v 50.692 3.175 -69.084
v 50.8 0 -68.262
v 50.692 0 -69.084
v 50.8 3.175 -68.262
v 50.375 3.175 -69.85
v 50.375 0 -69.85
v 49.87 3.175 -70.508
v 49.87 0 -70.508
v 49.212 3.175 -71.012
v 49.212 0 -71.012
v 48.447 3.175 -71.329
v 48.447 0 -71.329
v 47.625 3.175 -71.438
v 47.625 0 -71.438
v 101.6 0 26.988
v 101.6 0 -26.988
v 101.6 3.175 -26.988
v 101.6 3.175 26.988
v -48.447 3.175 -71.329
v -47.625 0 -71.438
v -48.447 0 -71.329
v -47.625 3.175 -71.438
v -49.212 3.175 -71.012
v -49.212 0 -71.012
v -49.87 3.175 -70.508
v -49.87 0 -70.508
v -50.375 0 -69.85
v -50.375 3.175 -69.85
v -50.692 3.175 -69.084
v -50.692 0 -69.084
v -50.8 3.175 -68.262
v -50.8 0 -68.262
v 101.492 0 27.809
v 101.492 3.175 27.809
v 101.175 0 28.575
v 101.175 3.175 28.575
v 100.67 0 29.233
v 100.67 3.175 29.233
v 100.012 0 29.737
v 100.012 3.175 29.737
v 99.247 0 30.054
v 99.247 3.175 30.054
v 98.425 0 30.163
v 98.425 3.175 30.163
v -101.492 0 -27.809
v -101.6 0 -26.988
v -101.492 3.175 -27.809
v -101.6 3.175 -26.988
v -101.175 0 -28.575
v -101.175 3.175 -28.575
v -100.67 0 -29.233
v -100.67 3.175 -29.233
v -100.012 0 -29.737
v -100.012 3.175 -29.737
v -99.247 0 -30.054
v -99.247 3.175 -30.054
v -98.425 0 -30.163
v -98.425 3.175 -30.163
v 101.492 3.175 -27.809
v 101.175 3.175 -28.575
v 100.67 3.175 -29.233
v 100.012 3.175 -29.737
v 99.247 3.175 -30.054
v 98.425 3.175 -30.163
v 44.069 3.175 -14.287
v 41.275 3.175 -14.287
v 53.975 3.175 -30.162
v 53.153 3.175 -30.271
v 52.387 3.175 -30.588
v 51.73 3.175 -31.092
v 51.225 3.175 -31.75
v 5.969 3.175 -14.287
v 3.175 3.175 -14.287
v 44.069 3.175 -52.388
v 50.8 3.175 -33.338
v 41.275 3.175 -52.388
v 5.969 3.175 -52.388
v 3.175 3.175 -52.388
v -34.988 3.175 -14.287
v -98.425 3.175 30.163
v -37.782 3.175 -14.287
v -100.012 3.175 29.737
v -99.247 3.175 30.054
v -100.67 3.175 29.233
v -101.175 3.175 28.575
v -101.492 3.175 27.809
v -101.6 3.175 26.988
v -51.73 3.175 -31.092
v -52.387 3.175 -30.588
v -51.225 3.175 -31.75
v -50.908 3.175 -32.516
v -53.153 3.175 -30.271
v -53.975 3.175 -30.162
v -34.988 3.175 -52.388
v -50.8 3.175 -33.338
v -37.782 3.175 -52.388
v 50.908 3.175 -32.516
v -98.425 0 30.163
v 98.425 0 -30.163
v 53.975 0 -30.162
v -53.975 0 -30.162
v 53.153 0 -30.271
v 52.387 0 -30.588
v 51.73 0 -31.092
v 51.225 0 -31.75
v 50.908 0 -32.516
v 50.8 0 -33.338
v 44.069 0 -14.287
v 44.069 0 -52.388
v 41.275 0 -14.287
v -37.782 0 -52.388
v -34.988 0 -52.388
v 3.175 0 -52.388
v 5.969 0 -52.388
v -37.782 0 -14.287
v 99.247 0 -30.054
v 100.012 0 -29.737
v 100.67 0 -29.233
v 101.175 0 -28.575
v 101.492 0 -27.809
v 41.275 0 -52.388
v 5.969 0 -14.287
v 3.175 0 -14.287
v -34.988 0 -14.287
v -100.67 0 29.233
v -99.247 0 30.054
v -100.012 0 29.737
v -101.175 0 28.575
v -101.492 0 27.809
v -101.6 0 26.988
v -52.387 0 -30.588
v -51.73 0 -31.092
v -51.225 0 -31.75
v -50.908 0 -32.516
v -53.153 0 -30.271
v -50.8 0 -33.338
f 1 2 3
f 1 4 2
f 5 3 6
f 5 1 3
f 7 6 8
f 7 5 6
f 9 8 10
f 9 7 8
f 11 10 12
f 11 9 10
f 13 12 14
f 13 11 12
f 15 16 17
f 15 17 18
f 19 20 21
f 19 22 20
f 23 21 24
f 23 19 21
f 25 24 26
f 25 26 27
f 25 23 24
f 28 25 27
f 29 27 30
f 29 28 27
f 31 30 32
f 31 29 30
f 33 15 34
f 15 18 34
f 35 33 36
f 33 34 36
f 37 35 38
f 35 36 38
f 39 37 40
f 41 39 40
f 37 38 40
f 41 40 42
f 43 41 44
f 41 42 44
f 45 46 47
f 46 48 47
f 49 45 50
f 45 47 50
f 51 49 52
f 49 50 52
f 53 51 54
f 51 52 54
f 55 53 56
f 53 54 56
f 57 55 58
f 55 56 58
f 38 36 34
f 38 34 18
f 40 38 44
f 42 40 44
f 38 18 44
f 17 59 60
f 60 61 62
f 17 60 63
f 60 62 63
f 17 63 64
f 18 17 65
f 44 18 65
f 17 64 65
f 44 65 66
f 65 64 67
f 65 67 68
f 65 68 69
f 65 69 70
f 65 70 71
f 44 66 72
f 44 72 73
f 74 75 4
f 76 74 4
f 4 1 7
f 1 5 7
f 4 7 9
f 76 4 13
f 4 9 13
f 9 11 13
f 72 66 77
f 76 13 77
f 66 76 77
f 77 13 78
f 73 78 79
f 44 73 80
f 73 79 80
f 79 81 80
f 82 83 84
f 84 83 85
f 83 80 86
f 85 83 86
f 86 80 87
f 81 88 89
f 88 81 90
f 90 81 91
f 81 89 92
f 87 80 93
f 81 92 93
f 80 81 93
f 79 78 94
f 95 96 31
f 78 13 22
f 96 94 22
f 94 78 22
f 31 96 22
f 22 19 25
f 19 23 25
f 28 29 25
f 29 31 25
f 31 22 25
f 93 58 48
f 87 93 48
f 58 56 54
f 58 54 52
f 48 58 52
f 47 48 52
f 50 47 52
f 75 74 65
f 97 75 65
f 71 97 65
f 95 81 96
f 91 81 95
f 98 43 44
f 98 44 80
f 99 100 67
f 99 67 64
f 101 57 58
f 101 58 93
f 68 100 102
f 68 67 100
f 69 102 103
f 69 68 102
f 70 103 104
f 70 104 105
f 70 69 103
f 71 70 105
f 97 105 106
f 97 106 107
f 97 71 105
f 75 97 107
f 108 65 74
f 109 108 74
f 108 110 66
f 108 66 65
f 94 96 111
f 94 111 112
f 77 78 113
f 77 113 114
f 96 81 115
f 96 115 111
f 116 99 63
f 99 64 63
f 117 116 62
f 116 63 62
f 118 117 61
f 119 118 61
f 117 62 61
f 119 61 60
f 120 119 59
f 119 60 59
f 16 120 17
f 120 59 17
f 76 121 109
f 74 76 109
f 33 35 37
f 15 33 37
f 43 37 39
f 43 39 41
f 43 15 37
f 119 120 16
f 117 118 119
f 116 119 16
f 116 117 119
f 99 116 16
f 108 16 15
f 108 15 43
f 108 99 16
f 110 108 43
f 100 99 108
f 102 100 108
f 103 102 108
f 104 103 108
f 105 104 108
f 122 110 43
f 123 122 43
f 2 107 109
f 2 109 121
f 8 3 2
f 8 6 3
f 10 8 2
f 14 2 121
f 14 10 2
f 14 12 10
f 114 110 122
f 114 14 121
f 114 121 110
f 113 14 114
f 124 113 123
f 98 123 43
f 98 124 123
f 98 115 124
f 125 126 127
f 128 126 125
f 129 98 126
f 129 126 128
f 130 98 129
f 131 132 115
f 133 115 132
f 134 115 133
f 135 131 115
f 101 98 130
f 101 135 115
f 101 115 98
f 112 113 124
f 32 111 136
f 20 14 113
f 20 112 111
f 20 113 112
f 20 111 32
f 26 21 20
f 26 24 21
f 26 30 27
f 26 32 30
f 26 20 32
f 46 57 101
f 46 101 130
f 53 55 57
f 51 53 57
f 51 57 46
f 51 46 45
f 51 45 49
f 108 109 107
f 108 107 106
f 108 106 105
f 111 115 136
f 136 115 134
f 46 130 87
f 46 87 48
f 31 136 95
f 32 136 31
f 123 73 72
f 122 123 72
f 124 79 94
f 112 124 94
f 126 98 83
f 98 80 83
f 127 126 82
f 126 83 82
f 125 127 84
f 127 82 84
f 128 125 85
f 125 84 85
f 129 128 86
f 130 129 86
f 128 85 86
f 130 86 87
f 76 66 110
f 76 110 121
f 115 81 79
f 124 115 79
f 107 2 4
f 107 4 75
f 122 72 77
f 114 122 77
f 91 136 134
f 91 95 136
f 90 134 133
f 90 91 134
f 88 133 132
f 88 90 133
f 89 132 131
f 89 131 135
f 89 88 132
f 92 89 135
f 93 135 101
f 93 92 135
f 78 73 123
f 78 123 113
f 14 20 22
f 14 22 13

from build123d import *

# Parameters (mm, degrees)
BOSS_EXTRUDE1_DEPTH = 3.175
SKETCH2_W           = 2.794
SKETCH2_H           = 38.1
CUT_EXTRUDE1_DEPTH  = 3.175
FILLET1_R           = 3.175
SKETCH3_W           = 2.794
SKETCH3_H           = 38.1
CUT_EXTRUDE2_DEPTH  = 9.525
SKETCH4_W           = 2.794
SKETCH4_H           = 38.1
CUT_EXTRUDE3_DEPTH  = 3.175


with BuildPart() as part:
    # Sketch1 → Boss-Extrude1 (new body)
    with BuildSketch(Plane(origin=(0, 0, 0), x_dir=(1, 0, 0), z_dir=(0, 1, 0))):
        Polygon((50.8, 30.1625), (101.6, 30.1625), (101.6, -30.1625), (-101.6, -30.1625), (-101.6, 30.1625), (-50.8, 30.1625), (-50.8, 71.4375), (50.8, 71.4375), align=None)
    extrude(amount=BOSS_EXTRUDE1_DEPTH)

    # Sketch2 → Cut-Extrude1 (cut)
    with BuildSketch(Plane(origin=(0, 3.175, 0), x_dir=(1, 0, 0), z_dir=(0, 1, 0))):
        with Locations((4.572, 33.3375)):
            Rectangle(SKETCH2_W, SKETCH2_H)
    extrude(amount=-CUT_EXTRUDE1_DEPTH, mode=Mode.SUBTRACT)

    # Fillet1
    fillet1_edges = [part.edges().sort_by_distance(p)[0] for p in [
        (101.6, 1.5875, 30.1625),
        (-101.6, 1.5875, 30.1625),
        (-101.6, 1.5875, -30.1625),
        (-50.8, 1.5875, -30.1625),
        (-50.8, 1.5875, -71.4375),
        (50.8, 1.5875, -71.4375),
        (50.8, 1.5875, -30.1625),
        (101.6, 1.5875, -30.1625),
    ]]
    fillet(fillet1_edges, radius=FILLET1_R)

    # Sketch3 → Cut-Extrude2 (cut)
    with BuildSketch(Plane(origin=(0, 3.175, 0), x_dir=(1, 0, 0), z_dir=(0, 1, 0))):
        with Locations((-36.3855, 33.3375)):
            Rectangle(SKETCH3_W, SKETCH3_H)
    extrude(amount=-CUT_EXTRUDE2_DEPTH, mode=Mode.SUBTRACT)

    # Sketch4 → Cut-Extrude3 (cut)
    with BuildSketch(Plane(origin=(0, 3.175, 0), x_dir=(1, 0, 0), z_dir=(0, 1, 0))):
        with Locations((42.672, 33.3375)):
            Rectangle(SKETCH4_W, SKETCH4_H)
    extrude(amount=-CUT_EXTRUDE3_DEPTH, mode=Mode.SUBTRACT)


solid = part.part
